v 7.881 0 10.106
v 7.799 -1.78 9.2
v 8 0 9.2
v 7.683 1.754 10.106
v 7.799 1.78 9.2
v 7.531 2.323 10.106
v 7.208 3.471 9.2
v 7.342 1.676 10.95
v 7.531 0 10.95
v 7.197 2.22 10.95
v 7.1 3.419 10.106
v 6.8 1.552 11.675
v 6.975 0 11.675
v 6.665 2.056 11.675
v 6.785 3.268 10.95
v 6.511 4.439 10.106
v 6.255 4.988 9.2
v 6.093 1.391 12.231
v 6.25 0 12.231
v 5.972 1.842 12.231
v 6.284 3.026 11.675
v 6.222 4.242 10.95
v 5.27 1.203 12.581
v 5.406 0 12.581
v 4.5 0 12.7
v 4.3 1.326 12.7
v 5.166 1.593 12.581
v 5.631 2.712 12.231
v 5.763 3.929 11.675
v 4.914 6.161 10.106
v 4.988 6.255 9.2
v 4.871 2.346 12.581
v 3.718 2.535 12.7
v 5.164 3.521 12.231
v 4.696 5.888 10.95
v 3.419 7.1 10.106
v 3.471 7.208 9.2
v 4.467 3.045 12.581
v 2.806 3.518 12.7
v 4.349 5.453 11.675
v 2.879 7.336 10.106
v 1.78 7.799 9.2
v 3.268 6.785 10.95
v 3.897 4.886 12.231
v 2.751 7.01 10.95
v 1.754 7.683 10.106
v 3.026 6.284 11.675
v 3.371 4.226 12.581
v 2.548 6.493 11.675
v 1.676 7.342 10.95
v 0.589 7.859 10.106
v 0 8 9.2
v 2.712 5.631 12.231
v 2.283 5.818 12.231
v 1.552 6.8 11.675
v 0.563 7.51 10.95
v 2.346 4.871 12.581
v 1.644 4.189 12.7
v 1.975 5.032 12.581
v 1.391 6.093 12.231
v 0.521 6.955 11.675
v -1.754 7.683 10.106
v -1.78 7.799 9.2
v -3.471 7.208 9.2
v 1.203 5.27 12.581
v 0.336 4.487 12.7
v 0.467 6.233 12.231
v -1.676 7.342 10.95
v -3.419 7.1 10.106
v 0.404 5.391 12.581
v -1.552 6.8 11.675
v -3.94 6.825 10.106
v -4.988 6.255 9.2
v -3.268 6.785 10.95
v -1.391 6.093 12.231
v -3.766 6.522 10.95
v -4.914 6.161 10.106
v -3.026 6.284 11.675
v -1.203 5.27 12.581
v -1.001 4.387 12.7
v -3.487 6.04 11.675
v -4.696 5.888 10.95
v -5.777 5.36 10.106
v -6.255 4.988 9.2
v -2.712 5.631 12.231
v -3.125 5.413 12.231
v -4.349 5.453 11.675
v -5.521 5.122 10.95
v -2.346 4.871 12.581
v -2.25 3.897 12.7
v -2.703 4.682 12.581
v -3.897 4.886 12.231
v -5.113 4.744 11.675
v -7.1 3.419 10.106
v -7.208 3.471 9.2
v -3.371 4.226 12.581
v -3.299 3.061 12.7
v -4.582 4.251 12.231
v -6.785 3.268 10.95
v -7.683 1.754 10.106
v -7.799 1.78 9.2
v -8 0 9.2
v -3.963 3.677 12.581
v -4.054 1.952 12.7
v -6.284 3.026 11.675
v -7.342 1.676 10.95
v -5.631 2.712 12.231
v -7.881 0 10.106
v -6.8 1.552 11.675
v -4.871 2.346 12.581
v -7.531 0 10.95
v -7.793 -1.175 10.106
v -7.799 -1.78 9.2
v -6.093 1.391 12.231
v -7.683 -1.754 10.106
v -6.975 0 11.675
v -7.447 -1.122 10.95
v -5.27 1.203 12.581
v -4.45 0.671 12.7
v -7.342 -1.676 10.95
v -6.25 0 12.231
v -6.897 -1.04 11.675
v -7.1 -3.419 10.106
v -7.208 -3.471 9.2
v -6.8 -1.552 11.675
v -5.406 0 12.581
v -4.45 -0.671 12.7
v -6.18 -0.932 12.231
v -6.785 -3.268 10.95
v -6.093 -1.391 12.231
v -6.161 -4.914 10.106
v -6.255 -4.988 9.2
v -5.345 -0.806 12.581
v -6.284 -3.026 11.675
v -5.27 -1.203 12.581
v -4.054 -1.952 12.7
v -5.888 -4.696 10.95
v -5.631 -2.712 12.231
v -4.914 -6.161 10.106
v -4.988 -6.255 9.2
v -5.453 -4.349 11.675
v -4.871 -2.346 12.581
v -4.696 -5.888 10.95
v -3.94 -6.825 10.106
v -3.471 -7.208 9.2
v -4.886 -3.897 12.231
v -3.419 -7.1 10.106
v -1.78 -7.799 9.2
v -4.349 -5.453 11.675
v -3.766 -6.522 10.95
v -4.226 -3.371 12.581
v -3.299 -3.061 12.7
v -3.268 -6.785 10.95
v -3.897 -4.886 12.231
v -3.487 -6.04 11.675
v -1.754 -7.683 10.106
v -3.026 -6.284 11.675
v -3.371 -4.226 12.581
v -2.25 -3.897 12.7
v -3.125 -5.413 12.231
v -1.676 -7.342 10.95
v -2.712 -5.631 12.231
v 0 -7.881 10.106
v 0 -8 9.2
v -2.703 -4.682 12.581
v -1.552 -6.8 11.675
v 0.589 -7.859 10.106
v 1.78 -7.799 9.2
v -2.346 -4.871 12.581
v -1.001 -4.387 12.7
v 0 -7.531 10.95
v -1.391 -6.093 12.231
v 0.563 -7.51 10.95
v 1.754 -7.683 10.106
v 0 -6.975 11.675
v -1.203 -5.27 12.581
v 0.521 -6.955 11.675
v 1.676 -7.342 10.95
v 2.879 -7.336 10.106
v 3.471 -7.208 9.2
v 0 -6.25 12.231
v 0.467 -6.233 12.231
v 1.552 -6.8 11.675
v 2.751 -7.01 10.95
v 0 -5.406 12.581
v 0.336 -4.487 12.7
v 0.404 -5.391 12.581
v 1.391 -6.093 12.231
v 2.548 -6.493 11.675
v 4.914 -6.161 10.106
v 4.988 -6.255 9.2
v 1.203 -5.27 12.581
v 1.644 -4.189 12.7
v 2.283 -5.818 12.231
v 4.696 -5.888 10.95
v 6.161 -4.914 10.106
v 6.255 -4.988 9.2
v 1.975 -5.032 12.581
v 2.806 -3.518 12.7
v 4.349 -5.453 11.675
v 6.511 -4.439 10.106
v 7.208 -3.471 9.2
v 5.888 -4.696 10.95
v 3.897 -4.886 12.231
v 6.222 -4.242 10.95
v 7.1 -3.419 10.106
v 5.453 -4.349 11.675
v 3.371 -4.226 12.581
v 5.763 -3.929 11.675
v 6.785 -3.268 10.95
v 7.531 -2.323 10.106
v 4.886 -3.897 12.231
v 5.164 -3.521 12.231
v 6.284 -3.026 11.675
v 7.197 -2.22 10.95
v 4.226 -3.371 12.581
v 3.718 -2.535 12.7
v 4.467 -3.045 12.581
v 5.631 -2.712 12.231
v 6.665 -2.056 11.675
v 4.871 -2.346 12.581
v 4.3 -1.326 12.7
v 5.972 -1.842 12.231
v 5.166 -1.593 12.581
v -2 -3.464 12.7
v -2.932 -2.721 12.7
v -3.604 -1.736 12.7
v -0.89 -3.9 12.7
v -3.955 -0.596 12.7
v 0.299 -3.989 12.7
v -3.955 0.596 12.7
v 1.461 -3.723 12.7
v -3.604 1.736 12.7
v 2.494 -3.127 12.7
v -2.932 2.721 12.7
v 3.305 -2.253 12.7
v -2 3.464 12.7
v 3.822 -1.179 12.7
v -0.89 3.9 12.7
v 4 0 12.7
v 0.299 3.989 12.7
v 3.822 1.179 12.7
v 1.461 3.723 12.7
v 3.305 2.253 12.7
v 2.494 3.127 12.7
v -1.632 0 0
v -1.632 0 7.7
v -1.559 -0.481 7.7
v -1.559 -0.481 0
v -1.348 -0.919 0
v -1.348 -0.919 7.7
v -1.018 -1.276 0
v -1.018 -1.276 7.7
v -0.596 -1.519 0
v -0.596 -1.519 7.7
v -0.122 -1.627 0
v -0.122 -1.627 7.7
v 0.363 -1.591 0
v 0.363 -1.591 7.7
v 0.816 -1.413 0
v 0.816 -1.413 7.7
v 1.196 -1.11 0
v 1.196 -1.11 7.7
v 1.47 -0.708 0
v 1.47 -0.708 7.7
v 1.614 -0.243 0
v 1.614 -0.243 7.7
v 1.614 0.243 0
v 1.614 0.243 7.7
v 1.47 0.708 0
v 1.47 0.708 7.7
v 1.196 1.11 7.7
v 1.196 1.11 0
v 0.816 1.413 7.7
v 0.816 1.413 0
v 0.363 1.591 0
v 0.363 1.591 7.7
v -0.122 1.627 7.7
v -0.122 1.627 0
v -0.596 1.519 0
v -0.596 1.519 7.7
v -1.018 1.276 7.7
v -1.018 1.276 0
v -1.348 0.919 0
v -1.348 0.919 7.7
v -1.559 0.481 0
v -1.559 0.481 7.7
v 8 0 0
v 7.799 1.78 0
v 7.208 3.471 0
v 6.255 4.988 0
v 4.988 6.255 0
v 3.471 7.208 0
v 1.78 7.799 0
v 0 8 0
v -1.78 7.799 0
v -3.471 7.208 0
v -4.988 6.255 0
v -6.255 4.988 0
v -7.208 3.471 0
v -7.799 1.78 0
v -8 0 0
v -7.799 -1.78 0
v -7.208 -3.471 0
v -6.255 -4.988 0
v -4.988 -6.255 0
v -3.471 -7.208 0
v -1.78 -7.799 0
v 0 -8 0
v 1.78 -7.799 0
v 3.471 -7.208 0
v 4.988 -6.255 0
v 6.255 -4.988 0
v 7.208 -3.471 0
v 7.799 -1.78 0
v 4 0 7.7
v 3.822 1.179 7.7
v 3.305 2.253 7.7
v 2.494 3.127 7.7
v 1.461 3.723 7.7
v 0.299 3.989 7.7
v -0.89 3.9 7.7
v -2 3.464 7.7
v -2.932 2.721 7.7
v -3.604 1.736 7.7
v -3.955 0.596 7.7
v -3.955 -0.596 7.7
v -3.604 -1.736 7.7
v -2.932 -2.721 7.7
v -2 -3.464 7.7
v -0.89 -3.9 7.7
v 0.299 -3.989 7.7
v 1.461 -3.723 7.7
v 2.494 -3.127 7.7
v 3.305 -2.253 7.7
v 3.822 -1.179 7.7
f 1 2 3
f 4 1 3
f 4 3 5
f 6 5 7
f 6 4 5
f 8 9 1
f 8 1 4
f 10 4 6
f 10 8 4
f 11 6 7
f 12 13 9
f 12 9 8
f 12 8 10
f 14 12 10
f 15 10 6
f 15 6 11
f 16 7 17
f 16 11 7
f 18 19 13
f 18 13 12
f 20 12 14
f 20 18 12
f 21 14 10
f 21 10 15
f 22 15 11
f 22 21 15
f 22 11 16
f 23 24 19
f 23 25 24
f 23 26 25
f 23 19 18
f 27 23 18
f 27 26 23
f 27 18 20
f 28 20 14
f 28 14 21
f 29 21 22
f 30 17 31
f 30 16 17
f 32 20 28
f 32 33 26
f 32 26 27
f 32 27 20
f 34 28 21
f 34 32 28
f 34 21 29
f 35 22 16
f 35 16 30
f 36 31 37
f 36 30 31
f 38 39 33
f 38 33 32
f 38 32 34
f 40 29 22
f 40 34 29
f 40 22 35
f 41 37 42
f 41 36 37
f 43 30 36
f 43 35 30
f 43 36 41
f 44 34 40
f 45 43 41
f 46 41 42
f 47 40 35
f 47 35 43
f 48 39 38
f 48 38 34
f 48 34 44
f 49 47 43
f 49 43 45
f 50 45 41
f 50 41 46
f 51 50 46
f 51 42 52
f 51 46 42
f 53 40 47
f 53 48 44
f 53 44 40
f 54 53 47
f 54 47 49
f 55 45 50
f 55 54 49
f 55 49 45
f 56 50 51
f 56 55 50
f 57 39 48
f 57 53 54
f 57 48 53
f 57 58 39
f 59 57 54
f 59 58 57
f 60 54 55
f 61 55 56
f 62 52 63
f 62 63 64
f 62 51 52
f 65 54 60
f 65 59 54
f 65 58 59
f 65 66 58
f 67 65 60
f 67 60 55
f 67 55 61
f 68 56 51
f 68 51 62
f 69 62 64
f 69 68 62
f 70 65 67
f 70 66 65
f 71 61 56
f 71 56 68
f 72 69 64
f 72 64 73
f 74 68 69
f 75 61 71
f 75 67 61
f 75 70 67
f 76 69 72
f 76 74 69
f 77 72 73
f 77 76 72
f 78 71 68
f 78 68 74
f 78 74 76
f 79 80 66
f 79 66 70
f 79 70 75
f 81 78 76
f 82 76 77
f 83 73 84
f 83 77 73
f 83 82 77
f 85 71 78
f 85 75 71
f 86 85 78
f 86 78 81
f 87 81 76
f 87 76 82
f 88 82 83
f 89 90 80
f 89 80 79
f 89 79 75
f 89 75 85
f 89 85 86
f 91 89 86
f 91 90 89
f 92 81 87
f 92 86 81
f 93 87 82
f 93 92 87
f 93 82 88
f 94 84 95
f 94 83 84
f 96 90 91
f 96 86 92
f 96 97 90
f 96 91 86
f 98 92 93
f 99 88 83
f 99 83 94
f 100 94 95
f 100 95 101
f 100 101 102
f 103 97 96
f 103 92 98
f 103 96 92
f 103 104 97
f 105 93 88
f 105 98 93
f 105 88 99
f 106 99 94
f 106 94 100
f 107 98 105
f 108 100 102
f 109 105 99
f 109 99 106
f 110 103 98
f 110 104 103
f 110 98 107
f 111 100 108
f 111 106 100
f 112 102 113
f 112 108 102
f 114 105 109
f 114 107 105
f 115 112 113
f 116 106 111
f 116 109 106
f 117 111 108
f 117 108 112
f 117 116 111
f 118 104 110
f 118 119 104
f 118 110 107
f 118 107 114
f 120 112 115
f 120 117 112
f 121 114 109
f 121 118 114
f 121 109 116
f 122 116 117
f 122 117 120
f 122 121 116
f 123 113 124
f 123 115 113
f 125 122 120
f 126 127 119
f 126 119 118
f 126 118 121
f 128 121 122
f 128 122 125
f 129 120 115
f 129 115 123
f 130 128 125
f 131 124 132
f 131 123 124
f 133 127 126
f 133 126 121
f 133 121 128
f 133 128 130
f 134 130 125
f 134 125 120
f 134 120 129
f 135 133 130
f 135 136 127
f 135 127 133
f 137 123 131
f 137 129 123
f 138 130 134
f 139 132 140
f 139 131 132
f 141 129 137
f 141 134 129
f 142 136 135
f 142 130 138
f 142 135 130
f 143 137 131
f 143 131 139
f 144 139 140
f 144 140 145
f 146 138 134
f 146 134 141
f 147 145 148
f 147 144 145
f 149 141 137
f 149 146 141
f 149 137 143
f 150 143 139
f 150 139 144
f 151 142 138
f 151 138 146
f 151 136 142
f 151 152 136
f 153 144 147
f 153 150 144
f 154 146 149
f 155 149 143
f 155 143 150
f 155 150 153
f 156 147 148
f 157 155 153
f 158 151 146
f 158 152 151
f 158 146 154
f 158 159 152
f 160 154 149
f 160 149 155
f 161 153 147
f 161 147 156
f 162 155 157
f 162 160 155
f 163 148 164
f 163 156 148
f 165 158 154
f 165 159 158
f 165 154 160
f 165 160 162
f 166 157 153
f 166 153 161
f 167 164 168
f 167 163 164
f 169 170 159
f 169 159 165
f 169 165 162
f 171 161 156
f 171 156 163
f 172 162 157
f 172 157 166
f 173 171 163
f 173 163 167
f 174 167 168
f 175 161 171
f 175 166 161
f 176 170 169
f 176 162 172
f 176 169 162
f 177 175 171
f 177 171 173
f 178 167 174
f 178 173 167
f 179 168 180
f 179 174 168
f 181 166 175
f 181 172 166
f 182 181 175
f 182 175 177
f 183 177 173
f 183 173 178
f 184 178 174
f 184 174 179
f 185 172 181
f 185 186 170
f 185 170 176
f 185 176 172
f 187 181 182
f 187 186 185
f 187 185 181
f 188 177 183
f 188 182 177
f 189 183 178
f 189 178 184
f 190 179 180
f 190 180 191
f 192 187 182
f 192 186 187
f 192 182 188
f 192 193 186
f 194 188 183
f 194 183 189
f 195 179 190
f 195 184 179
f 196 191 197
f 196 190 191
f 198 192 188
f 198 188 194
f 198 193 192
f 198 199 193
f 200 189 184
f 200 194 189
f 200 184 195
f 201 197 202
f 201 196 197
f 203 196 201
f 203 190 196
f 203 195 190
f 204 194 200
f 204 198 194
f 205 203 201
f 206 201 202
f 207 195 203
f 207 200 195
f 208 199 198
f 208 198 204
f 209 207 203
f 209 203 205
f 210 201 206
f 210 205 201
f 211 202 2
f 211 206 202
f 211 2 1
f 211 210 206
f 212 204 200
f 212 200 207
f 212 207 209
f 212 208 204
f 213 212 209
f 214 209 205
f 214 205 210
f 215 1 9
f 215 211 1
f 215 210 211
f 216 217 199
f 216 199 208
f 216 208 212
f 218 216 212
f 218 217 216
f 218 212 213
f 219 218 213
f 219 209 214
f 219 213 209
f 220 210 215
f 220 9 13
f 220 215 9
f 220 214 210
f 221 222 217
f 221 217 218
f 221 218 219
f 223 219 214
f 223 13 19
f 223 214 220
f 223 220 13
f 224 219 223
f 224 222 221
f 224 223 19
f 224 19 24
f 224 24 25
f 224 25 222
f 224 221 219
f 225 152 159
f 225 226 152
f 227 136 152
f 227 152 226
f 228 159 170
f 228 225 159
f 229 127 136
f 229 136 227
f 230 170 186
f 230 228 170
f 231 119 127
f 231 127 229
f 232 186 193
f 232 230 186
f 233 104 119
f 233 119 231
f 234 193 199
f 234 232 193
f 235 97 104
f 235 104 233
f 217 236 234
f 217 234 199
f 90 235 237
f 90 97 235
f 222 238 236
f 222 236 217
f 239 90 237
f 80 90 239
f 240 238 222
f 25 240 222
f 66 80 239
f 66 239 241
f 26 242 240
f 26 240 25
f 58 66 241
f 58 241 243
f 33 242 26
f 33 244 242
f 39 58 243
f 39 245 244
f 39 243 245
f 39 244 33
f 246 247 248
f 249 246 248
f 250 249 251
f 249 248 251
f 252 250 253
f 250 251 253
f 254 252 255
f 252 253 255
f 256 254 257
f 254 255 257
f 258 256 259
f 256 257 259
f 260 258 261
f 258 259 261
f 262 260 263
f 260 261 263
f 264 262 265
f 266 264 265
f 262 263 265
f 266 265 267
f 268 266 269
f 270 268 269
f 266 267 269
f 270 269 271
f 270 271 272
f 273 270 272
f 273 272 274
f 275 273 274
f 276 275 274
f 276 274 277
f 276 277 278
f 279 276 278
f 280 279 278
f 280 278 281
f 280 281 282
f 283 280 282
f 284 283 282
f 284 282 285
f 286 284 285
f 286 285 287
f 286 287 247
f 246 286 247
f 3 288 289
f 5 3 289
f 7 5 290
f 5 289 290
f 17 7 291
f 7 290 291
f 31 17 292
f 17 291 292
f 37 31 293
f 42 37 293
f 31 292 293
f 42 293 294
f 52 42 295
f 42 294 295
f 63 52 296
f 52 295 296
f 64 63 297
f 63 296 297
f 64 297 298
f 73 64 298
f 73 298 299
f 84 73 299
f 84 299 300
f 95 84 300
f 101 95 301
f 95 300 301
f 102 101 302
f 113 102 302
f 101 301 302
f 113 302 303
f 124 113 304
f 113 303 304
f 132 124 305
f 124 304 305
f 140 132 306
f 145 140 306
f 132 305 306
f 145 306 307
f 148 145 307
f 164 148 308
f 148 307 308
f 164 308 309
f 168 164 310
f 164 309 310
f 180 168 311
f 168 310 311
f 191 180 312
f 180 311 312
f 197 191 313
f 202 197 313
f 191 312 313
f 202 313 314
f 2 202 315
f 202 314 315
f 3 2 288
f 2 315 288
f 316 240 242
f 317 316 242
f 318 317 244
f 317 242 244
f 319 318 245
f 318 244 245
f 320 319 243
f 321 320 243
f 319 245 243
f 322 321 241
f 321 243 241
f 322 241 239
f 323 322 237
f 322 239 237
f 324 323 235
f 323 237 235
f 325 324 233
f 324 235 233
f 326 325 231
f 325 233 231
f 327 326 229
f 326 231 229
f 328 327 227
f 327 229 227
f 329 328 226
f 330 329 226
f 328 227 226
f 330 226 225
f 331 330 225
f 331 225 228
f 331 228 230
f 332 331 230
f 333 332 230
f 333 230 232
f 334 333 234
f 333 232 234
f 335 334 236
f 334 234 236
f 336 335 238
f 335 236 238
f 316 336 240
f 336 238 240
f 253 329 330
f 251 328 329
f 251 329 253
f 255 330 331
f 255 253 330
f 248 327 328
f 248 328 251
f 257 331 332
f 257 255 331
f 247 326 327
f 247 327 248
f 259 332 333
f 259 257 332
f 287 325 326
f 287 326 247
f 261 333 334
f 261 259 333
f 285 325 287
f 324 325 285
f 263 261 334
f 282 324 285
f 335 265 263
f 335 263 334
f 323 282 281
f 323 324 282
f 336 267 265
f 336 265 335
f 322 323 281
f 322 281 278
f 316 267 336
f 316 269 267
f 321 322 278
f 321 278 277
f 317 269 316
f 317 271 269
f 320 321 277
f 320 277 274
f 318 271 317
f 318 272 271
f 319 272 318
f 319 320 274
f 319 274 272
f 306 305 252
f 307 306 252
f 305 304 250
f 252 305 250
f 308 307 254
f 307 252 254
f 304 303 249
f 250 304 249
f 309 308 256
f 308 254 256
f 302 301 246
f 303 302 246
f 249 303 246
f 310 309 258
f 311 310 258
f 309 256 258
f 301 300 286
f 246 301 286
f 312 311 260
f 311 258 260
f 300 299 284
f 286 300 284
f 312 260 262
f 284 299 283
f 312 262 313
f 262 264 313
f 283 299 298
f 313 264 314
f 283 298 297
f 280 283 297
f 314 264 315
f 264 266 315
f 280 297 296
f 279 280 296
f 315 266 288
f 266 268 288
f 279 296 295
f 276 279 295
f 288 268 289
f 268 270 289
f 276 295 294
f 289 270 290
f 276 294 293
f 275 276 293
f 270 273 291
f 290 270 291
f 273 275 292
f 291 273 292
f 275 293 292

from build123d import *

# Parameters (mm, degrees)
F0_R     = 8
F1_DEPTH = 12.7
F2_R     = 4
F3_DEPTH = 5
F4_D     = 3.2639
F5_R     = 3.5


# Not quite as in the source:
# - a feature names something its author has since deleted; it is built from what else it names


with BuildPart() as f1:
    # F0 (on Top) → F1 (new body)
    with BuildSketch(Plane.XY):
        Circle(F0_R)
    extrude(amount=F1_DEPTH)

    # F2 (on face) → F3 (cut)
    with BuildSketch(Plane.XY.offset(12.7)):
        Circle(F2_R)
    extrude(amount=-F3_DEPTH, mode=Mode.SUBTRACT)

    # F4 (through all)
    with Locations(Plane(origin=(0, 0, 0), x_dir=(1, 0, 0), z_dir=(0, 0, -1))):
        with Locations((0, 0)):
            Hole(F4_D / 2)

    # F5
    f5_edges = [f1.edges().sort_by_distance(p)[0] for p in [
        (-8, 0, 12.7),
    ]]
    fillet(f5_edges, radius=F5_R)


solid = f1.part
